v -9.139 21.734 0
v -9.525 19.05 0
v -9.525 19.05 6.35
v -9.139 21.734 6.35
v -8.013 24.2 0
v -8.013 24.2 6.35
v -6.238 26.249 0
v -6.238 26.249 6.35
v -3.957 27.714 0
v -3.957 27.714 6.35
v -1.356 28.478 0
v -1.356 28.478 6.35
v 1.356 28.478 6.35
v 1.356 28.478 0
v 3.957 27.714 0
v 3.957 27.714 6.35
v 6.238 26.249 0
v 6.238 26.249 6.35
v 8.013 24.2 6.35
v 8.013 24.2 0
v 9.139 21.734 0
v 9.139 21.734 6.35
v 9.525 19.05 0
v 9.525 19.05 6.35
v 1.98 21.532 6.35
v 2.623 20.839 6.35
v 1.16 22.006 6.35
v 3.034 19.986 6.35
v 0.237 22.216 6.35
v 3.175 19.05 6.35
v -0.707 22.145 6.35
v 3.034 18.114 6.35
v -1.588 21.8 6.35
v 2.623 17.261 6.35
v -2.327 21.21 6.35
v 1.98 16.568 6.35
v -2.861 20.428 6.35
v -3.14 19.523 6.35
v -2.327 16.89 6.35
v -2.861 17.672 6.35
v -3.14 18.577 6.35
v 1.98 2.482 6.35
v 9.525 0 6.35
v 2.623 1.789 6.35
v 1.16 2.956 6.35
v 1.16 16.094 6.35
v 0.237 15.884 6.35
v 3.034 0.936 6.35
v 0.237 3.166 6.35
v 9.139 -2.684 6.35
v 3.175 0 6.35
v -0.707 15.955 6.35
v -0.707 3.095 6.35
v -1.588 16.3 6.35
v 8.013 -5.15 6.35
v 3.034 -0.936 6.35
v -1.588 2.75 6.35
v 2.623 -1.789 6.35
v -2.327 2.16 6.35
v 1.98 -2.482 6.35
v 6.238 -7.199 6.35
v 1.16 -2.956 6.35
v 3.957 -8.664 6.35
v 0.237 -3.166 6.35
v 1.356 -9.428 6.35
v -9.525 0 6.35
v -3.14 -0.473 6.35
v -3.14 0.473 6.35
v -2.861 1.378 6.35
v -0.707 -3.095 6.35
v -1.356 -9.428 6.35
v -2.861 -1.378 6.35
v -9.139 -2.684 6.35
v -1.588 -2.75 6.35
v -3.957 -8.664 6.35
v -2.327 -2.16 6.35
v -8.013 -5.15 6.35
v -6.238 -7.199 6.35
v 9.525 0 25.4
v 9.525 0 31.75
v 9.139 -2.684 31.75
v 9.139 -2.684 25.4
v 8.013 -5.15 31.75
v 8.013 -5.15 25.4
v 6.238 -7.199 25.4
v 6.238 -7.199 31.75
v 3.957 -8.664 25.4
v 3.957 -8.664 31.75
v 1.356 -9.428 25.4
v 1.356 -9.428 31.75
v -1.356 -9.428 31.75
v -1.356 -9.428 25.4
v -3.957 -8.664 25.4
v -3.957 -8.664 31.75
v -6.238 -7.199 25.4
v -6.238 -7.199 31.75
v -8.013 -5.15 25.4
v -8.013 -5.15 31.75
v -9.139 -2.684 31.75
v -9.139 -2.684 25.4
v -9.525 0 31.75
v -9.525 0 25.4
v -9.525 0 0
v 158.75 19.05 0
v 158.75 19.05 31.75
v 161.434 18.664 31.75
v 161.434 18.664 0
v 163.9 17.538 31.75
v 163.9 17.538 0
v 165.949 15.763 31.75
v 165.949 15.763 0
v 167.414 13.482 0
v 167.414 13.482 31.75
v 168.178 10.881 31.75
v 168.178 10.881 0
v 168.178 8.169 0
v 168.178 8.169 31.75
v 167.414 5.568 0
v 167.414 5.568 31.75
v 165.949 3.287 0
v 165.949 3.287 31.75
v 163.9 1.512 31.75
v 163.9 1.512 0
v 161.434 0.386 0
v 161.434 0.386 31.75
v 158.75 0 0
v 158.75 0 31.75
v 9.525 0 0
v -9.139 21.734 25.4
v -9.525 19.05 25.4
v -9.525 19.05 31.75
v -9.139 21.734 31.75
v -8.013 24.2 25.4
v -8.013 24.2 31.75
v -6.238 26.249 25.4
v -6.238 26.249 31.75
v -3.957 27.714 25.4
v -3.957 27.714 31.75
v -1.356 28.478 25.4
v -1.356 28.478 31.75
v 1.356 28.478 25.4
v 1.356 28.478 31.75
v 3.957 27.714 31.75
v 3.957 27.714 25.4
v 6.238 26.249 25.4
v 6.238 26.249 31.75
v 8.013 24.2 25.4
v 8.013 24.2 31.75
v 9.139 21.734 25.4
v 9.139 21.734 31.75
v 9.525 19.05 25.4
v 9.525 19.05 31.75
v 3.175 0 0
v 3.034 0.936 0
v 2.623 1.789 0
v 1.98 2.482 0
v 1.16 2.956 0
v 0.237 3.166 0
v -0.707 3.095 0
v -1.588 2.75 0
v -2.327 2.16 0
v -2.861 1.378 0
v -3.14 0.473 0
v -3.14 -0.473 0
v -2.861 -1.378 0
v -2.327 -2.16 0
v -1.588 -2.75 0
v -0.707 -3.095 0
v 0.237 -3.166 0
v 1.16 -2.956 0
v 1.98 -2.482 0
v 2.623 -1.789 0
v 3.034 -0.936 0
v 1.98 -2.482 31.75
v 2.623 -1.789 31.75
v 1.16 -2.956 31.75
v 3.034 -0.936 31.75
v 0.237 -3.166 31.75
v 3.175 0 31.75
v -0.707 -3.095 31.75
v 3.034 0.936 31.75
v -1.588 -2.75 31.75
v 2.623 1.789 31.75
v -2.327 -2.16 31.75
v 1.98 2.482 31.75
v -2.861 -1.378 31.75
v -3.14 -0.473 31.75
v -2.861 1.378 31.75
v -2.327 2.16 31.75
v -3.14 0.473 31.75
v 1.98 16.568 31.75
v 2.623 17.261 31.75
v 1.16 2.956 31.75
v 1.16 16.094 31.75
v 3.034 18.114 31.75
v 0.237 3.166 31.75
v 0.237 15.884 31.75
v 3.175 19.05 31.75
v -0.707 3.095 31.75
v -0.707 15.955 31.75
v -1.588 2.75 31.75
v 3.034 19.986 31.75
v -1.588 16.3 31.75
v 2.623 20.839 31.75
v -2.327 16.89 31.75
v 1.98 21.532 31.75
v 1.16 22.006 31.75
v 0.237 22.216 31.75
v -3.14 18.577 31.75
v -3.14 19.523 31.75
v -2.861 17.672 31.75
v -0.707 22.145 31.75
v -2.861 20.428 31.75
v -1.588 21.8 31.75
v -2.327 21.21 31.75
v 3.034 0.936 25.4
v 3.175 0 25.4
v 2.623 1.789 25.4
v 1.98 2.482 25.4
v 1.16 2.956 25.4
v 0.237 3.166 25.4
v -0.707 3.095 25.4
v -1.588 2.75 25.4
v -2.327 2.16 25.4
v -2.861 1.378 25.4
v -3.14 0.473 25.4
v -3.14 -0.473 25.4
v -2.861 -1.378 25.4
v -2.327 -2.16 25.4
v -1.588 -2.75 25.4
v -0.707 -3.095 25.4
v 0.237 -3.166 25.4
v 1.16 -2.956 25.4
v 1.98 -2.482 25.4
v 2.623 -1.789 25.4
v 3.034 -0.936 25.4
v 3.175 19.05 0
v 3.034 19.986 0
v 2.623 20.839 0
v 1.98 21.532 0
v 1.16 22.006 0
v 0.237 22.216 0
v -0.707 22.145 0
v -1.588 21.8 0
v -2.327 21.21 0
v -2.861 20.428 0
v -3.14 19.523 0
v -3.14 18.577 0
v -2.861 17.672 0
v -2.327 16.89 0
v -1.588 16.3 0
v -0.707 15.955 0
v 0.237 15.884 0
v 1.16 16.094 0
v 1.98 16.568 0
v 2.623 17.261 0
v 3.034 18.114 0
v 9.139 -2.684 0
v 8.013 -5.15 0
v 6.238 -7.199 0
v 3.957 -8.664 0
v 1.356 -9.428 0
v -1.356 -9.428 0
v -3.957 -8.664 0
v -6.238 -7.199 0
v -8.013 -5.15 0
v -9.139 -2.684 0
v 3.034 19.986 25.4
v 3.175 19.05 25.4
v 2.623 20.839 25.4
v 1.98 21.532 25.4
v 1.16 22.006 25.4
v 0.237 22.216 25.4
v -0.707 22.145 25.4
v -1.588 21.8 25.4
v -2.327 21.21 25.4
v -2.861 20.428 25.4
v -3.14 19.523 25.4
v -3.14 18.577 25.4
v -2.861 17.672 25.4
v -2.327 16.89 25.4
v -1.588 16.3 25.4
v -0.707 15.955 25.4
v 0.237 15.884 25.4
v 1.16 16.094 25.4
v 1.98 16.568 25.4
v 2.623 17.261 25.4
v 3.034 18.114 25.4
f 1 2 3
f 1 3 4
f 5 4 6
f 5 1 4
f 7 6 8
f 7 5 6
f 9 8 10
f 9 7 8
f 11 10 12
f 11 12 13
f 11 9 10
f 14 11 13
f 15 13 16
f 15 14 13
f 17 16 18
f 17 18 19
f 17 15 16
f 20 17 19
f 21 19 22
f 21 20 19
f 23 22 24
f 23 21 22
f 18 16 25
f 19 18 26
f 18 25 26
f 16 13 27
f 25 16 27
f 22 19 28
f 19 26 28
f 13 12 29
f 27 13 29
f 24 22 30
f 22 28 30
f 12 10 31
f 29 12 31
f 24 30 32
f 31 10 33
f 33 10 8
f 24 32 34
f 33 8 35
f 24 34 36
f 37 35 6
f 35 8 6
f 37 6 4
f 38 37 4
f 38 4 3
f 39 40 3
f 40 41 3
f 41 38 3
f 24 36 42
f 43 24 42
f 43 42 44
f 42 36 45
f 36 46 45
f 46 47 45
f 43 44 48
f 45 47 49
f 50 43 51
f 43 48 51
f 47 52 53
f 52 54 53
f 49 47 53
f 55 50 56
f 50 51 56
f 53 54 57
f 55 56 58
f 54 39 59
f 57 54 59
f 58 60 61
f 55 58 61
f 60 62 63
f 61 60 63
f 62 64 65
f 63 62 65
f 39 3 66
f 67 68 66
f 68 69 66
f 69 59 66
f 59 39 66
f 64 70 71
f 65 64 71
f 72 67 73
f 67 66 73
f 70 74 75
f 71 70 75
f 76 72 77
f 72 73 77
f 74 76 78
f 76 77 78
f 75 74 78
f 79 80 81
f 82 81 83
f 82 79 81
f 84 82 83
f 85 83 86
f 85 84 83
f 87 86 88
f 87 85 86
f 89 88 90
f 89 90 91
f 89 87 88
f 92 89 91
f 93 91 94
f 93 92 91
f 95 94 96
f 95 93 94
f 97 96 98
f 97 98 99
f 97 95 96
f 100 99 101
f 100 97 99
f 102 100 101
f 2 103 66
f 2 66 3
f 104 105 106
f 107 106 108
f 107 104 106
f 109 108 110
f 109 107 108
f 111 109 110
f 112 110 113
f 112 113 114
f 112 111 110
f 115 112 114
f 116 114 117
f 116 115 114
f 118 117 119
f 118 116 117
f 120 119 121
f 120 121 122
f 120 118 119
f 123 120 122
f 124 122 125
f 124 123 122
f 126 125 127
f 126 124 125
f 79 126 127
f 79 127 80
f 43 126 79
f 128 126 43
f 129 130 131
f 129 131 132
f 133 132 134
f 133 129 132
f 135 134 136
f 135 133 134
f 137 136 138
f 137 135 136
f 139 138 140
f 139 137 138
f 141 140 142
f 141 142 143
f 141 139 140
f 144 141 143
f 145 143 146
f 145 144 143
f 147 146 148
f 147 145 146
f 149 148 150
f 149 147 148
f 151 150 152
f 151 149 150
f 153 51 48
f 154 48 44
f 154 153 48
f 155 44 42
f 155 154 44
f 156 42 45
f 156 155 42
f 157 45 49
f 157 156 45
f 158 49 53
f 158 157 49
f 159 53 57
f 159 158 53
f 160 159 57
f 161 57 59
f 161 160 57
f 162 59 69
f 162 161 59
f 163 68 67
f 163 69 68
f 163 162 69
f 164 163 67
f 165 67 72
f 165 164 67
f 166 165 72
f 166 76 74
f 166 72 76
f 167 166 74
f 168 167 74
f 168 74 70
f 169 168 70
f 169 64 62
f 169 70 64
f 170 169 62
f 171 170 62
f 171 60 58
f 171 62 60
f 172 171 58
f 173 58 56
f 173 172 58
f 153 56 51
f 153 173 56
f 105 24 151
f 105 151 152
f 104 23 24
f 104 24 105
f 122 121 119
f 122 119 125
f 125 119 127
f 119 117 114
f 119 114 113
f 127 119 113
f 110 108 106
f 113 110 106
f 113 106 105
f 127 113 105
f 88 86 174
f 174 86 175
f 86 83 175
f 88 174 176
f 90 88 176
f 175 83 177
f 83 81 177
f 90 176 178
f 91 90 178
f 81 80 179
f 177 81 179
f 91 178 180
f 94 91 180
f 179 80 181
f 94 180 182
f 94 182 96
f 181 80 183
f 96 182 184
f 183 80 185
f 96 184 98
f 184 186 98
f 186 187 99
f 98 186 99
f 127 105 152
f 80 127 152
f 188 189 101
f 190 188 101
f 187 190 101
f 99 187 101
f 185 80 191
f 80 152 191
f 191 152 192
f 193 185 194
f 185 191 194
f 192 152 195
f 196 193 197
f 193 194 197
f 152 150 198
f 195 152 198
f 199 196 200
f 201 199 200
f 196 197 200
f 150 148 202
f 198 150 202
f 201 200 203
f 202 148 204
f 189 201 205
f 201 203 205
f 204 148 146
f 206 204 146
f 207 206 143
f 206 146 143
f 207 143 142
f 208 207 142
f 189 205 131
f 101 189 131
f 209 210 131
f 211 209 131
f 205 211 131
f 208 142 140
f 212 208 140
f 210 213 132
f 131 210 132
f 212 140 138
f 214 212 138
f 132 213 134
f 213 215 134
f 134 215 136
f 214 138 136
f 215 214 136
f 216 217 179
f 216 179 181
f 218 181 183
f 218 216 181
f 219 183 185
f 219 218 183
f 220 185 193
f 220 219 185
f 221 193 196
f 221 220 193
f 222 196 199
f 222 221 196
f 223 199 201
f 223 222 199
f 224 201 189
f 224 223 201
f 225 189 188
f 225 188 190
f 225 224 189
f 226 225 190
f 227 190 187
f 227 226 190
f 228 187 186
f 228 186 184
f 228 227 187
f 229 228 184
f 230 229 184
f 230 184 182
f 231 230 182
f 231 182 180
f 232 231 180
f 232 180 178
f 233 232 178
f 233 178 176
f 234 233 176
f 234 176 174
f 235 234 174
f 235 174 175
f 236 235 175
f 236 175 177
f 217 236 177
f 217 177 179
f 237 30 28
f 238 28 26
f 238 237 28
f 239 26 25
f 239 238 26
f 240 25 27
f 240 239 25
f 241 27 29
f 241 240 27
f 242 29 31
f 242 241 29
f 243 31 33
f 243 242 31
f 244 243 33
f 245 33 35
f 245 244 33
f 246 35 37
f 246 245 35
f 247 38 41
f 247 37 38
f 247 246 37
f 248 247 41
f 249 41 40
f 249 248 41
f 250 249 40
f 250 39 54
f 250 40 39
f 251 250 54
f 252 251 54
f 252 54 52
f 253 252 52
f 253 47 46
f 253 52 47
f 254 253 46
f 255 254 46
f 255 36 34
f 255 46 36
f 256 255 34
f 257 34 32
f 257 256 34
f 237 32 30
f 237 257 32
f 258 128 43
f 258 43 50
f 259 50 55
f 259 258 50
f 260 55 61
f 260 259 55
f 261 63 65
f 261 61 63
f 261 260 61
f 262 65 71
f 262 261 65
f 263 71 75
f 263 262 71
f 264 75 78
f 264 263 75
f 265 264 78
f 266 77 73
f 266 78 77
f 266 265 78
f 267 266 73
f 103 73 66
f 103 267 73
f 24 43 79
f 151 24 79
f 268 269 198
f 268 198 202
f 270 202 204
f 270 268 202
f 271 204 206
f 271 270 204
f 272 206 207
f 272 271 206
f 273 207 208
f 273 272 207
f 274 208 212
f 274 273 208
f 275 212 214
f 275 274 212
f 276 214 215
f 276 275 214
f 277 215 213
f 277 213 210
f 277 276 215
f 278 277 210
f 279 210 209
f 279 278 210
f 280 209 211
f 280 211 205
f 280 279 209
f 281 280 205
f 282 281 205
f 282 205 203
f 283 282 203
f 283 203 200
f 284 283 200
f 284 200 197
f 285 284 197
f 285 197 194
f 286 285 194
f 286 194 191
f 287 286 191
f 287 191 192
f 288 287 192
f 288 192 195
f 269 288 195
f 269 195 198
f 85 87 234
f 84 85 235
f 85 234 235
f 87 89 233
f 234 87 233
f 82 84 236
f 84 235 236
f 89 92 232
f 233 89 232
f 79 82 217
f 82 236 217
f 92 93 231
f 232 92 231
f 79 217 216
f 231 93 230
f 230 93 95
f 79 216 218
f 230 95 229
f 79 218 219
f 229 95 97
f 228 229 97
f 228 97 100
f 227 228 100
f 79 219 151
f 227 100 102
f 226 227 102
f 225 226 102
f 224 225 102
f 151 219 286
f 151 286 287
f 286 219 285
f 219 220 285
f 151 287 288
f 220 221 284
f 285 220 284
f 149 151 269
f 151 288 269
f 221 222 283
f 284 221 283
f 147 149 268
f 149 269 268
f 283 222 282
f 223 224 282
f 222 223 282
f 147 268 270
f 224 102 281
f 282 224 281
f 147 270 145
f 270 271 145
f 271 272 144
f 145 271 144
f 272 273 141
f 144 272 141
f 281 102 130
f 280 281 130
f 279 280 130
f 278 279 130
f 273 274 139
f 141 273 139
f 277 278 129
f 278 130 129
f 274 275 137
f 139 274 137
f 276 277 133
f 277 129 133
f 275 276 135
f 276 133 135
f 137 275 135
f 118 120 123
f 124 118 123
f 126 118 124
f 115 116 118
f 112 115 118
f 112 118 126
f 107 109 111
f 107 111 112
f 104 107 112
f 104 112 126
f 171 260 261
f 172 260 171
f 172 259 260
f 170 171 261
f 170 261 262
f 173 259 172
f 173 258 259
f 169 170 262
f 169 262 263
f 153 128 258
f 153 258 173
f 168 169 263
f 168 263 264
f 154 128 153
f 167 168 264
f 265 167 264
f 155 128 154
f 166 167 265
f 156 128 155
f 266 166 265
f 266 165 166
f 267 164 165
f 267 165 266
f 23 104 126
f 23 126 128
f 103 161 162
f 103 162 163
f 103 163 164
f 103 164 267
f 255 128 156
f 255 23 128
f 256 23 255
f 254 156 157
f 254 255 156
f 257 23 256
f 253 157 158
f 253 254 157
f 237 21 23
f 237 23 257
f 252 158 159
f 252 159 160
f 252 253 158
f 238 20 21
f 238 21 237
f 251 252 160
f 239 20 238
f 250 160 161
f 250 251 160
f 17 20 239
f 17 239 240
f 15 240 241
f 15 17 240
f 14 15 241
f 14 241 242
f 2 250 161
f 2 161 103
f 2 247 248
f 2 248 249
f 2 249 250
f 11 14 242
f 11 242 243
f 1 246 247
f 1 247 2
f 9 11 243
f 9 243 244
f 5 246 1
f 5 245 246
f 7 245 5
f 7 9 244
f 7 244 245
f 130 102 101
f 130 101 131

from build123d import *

# Parameters (mm, degrees)
SKETCH1_R           = 3.175
BOSS_EXTRUDE1_DEPTH = 31.75
SKETCH6_W           = 19.05
SKETCH6_H           = 19.05
SKETCH6_H_2         = 9.525
CUT_EXTRUDE1_DEPTH  = 19.05


with BuildPart() as part:
    # Sketch1 → Boss-Extrude1 (new body)
    with BuildSketch(Plane.XY):
        with BuildLine():
            Line((-9.525, 0), (-9.525, 19.05))
            ThreePointArc((-9.525, 19.05), (0, 28.575), (9.525, 19.05))
            Line((9.525, 19.05), (158.75, 19.05))
            ThreePointArc((158.75, 19.05), (168.275, 9.525), (158.75, 0))
            Line((158.75, 0), (9.525, 0))
            ThreePointArc((9.525, 0), (0, -9.525), (-9.525, 0))
        make_face()
        with Locations((0, 19.05)):
            Circle(SKETCH1_R, mode=Mode.SUBTRACT)
        Circle(SKETCH1_R, mode=Mode.SUBTRACT)
    extrude(amount=BOSS_EXTRUDE1_DEPTH)

    # Sketch6 → Cut-Extrude1 (cut)
    with BuildSketch(Plane.ZY.offset(9.525)):
        with Locations((15.875, 9.525)):
            Rectangle(SKETCH6_W, SKETCH6_H)
        with Locations((15.875, 23.8125)):
            Rectangle(SKETCH6_W, SKETCH6_H_2)
        with Locations((15.875, -4.7625)):
            Rectangle(SKETCH6_W, SKETCH6_H_2)
    extrude(amount=-CUT_EXTRUDE1_DEPTH, mode=Mode.SUBTRACT)


solid = part.part
